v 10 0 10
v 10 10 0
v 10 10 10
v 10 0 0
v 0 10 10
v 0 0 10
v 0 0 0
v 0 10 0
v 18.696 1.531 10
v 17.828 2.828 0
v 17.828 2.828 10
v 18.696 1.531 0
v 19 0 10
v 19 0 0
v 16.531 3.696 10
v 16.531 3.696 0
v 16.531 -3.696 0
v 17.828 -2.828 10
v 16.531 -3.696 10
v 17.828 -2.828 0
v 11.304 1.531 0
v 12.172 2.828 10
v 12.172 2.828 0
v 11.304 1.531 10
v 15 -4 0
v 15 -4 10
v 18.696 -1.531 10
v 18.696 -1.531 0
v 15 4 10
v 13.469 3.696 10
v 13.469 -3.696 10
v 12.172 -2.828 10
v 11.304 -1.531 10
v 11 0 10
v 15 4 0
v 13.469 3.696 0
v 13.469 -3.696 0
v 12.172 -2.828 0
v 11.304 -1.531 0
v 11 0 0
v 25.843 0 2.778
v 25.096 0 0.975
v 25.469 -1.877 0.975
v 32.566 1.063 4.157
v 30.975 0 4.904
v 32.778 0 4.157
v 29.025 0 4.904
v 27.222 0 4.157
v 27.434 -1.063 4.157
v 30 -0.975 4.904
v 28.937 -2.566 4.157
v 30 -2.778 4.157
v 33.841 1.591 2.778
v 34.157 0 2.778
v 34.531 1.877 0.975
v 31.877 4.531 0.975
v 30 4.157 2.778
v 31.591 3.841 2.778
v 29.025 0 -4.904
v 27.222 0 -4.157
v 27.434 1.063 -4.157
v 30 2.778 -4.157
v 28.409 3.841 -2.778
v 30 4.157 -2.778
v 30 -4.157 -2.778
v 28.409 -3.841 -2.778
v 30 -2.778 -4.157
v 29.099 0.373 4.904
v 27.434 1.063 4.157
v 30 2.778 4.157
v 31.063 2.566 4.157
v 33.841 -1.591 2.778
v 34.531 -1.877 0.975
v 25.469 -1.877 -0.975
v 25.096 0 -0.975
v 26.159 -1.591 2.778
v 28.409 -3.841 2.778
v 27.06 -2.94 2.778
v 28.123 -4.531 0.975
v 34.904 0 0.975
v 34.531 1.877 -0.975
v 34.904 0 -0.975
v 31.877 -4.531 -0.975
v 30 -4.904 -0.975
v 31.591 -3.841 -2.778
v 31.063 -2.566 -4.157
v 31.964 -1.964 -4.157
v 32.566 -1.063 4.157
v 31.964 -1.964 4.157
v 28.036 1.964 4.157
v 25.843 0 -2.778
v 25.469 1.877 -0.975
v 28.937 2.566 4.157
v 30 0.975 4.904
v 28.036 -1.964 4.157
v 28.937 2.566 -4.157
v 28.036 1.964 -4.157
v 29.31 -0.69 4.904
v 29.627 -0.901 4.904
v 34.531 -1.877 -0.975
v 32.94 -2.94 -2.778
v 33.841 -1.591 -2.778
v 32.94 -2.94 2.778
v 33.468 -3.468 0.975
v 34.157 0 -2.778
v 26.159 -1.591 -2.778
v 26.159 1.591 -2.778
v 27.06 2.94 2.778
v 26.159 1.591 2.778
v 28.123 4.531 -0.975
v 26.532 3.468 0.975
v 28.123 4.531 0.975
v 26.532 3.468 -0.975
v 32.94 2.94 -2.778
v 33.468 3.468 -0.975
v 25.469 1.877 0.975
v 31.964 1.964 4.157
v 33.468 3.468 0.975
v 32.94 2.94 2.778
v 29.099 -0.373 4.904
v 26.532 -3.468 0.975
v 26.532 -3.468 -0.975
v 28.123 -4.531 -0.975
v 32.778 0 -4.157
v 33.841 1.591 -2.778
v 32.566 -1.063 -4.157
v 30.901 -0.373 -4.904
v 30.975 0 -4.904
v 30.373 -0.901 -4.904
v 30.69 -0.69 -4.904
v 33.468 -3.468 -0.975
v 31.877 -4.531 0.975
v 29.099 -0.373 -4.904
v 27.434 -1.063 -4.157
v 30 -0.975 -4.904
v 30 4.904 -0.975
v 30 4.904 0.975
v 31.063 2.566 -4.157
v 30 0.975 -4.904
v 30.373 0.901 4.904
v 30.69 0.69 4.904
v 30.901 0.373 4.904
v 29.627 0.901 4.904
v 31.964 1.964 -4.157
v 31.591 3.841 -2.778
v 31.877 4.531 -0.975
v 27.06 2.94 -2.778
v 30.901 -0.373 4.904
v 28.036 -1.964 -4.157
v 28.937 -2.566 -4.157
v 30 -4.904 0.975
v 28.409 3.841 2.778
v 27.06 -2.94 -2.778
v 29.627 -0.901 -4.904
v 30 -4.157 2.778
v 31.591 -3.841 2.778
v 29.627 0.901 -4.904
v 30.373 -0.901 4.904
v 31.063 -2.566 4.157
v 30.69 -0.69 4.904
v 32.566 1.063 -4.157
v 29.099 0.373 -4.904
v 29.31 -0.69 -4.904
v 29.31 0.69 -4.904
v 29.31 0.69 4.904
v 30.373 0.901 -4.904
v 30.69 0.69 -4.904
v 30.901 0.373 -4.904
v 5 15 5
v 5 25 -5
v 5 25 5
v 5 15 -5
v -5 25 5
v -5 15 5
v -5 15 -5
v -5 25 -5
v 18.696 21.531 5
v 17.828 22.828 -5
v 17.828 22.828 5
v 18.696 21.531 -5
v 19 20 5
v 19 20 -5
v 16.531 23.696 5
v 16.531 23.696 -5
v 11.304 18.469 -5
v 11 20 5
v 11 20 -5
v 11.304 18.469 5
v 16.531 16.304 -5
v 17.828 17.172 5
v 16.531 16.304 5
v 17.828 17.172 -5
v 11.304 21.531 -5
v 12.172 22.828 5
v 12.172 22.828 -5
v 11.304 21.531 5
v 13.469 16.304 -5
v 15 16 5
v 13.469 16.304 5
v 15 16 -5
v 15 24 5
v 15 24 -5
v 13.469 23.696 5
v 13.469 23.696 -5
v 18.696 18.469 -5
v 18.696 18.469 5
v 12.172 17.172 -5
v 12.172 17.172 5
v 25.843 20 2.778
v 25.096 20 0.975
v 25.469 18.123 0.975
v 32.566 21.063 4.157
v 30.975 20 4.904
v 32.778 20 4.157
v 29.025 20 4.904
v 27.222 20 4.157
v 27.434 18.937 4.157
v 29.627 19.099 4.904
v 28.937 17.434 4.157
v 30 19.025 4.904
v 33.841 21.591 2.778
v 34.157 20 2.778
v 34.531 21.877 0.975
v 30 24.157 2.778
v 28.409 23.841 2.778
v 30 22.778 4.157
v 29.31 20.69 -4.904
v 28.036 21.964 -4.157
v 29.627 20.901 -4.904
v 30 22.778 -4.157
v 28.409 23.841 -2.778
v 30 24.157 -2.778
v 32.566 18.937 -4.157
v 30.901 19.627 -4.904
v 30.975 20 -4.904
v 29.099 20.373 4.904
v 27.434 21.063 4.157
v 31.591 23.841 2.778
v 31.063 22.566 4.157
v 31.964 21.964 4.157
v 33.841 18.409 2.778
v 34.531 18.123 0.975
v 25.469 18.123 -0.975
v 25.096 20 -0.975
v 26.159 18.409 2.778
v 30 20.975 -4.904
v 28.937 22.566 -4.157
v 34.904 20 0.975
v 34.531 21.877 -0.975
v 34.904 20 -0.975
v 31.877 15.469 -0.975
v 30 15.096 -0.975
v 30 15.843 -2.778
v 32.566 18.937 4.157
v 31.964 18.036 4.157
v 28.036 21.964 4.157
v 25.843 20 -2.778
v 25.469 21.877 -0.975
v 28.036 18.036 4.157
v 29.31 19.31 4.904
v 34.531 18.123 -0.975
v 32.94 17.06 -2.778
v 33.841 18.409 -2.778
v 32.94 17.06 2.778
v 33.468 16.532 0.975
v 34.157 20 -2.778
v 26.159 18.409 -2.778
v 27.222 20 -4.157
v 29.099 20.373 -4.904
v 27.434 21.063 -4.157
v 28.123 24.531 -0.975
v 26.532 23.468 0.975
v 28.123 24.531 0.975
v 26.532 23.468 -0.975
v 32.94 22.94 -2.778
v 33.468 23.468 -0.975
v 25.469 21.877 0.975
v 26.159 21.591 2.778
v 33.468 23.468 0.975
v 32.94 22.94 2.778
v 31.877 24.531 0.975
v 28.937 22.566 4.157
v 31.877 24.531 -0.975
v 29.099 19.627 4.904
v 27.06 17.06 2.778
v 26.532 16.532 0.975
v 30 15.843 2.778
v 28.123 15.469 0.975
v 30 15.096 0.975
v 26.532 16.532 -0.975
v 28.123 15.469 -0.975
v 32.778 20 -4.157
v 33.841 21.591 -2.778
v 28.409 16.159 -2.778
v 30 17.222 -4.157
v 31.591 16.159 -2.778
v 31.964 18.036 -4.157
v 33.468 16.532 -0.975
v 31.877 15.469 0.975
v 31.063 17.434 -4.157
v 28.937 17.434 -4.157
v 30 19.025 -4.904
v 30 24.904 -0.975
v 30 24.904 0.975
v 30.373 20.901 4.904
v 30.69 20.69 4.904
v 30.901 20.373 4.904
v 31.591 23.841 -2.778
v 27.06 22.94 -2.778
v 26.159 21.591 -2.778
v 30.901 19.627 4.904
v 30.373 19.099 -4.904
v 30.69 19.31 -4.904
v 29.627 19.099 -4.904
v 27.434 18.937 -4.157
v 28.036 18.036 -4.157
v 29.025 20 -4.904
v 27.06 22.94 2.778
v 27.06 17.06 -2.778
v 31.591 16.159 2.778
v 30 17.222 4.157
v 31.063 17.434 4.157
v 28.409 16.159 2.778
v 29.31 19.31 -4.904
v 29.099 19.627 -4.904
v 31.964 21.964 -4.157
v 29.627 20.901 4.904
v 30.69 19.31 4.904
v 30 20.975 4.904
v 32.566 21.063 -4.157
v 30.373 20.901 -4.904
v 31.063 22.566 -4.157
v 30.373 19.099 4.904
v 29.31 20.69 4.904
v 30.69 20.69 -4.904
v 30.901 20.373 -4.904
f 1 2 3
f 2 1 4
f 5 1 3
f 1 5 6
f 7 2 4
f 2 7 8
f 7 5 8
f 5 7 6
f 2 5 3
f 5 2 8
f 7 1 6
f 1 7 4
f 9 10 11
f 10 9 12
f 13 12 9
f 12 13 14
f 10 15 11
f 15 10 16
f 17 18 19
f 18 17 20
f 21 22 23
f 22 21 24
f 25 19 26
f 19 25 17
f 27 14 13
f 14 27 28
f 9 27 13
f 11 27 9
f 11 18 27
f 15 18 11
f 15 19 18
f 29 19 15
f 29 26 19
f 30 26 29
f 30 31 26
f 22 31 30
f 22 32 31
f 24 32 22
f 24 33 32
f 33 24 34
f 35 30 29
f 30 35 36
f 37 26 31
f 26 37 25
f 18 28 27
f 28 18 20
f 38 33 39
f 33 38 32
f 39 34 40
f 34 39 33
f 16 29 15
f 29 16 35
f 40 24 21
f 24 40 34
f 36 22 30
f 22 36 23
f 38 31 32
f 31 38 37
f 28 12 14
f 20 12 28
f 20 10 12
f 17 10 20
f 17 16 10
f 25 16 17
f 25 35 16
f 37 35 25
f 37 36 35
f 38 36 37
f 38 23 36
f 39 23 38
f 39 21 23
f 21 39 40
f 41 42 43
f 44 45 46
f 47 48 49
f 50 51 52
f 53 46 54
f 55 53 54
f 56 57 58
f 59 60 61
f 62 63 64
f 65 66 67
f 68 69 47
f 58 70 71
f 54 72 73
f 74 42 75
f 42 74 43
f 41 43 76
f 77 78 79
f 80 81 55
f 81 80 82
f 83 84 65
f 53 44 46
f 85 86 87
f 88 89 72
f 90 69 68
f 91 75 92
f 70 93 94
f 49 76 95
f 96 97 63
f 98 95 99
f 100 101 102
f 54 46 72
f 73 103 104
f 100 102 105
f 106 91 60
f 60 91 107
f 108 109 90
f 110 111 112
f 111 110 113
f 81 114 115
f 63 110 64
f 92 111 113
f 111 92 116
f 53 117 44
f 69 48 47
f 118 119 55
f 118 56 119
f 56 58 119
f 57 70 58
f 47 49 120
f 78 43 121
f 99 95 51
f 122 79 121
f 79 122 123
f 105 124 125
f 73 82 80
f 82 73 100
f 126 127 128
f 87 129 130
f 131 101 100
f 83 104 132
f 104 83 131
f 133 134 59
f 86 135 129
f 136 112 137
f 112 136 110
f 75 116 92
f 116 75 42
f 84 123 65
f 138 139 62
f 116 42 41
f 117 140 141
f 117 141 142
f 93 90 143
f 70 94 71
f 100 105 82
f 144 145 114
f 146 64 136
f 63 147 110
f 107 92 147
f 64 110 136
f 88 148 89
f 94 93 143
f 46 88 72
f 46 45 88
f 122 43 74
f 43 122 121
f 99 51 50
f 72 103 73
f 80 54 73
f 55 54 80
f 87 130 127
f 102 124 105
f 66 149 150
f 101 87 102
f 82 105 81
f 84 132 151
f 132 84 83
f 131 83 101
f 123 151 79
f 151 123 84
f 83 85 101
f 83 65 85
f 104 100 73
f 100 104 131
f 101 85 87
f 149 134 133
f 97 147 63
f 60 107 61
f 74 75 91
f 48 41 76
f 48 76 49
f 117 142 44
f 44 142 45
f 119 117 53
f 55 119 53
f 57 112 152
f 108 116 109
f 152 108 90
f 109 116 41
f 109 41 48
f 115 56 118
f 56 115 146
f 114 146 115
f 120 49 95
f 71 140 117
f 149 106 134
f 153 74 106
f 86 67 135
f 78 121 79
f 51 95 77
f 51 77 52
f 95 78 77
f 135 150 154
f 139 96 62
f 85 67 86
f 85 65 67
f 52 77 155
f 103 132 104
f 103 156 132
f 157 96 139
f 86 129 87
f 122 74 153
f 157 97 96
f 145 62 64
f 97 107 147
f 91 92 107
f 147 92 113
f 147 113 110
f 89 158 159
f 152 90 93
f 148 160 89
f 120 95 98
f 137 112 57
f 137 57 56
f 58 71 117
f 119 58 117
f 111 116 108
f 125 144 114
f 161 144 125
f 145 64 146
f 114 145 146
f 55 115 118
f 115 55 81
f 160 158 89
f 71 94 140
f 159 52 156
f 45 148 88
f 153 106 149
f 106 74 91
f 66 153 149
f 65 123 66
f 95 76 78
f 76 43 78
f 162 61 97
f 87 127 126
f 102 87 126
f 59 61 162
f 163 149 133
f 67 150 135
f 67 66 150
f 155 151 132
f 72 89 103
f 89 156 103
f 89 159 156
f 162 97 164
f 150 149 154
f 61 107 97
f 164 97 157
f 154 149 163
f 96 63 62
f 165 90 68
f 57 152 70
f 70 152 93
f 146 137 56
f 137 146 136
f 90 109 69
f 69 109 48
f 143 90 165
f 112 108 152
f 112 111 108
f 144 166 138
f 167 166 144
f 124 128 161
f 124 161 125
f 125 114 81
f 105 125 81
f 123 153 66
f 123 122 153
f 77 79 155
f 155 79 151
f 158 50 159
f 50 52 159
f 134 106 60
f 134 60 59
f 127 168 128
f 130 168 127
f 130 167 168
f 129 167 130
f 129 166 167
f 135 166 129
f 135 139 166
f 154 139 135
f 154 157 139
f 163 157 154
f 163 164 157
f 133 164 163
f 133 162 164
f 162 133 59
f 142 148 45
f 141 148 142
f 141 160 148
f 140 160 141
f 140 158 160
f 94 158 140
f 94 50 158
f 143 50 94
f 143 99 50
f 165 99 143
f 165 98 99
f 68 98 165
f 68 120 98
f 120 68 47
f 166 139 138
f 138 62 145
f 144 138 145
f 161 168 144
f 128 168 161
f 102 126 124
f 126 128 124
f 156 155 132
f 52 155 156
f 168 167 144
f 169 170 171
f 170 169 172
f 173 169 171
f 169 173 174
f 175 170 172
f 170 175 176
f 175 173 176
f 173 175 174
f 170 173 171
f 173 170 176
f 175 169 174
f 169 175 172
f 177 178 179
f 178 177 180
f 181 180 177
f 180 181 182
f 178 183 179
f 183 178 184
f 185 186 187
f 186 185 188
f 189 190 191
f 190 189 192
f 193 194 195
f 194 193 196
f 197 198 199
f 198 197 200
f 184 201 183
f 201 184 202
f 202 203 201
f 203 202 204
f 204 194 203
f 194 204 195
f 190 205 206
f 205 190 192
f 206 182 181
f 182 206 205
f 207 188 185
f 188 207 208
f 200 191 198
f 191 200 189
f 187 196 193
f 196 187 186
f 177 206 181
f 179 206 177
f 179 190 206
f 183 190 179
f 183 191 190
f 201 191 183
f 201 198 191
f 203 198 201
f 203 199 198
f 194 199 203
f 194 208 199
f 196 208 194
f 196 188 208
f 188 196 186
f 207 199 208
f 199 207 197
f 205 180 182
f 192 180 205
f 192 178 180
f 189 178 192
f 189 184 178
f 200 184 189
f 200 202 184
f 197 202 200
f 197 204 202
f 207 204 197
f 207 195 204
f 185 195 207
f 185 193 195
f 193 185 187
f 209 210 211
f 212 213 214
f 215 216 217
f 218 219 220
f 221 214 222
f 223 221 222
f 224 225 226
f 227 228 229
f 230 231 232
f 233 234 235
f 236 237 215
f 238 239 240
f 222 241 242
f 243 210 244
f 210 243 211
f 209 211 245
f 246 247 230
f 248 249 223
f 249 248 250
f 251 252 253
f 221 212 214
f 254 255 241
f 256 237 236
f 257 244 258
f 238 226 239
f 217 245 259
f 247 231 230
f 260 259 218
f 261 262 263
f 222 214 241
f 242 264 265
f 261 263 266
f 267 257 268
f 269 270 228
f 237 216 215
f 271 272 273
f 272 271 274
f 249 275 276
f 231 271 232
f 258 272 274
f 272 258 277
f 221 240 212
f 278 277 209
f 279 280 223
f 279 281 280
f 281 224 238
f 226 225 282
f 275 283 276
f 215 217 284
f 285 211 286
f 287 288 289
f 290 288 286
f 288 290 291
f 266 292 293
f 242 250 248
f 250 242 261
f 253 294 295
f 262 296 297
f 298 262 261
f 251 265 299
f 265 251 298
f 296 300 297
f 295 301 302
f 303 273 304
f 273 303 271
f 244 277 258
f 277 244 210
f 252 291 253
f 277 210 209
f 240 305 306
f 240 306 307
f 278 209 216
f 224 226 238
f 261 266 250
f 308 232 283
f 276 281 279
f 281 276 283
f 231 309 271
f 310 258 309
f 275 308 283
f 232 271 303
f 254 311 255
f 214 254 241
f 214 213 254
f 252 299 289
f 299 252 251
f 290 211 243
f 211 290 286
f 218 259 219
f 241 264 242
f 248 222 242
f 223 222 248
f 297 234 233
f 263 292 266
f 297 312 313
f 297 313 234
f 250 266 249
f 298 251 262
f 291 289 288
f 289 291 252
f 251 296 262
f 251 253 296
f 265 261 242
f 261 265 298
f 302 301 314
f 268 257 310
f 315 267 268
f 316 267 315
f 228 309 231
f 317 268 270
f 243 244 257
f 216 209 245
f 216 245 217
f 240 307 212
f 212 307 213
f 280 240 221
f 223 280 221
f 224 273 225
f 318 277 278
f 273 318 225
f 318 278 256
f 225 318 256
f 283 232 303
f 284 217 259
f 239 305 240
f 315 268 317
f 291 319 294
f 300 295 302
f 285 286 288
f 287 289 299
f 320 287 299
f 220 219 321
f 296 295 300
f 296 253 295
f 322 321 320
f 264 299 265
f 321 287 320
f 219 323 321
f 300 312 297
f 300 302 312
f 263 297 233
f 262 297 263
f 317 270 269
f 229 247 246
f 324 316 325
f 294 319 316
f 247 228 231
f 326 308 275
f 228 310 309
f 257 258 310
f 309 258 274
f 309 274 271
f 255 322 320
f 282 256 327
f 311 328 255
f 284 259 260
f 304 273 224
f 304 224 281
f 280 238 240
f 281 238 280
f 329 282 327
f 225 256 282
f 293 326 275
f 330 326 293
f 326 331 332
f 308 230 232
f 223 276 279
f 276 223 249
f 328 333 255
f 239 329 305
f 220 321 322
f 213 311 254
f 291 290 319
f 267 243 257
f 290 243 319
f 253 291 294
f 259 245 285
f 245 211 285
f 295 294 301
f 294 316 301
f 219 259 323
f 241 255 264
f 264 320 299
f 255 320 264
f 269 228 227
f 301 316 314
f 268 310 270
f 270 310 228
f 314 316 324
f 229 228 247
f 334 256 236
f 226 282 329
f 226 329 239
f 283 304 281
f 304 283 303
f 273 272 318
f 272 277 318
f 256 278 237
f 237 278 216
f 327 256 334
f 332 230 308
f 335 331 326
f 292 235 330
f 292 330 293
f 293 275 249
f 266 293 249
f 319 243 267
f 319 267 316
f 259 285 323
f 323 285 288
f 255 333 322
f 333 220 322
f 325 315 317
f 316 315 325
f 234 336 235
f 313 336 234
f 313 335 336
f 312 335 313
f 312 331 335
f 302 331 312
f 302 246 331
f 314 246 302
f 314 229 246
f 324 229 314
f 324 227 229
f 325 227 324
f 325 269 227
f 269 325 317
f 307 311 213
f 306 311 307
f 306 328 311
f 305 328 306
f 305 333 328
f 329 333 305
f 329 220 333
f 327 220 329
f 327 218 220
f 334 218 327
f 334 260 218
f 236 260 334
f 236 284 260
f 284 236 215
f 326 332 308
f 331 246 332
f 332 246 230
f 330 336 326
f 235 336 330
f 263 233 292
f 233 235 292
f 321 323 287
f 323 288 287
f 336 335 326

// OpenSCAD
// TEST 02: center=true vs center=false
// Expected: left column = default (false), right column = centered.
// Check: the "c" checkbox reflects each shape's center flag.
// Check: the mesh origin matches — centered shape straddles Z=0.

$fn = 16;

// --- center=false (default) ---
translate([0, 0, 0]) {
    cube([10, 10, 10]);           // bottom face at Z=0
}
translate([15, 0, 0]) {
    cylinder(h=10, r=4);          // bottom at Z=0
}
translate([30, 0, 0]) {
    sphere(r=5);                  // center=false has no effect on sphere; still centered
}

// --- center=true ---
translate([0, 20, 0]) {
    cube([10, 10, 10], center=true);   // straddles Z=0
}
translate([15, 20, 0]) {
    cylinder(h=10, r=4, center=true);  // straddles Z=0
}
translate([30, 20, 0]) {
    sphere(r=5);                       // same as above; sphere always centered
}
